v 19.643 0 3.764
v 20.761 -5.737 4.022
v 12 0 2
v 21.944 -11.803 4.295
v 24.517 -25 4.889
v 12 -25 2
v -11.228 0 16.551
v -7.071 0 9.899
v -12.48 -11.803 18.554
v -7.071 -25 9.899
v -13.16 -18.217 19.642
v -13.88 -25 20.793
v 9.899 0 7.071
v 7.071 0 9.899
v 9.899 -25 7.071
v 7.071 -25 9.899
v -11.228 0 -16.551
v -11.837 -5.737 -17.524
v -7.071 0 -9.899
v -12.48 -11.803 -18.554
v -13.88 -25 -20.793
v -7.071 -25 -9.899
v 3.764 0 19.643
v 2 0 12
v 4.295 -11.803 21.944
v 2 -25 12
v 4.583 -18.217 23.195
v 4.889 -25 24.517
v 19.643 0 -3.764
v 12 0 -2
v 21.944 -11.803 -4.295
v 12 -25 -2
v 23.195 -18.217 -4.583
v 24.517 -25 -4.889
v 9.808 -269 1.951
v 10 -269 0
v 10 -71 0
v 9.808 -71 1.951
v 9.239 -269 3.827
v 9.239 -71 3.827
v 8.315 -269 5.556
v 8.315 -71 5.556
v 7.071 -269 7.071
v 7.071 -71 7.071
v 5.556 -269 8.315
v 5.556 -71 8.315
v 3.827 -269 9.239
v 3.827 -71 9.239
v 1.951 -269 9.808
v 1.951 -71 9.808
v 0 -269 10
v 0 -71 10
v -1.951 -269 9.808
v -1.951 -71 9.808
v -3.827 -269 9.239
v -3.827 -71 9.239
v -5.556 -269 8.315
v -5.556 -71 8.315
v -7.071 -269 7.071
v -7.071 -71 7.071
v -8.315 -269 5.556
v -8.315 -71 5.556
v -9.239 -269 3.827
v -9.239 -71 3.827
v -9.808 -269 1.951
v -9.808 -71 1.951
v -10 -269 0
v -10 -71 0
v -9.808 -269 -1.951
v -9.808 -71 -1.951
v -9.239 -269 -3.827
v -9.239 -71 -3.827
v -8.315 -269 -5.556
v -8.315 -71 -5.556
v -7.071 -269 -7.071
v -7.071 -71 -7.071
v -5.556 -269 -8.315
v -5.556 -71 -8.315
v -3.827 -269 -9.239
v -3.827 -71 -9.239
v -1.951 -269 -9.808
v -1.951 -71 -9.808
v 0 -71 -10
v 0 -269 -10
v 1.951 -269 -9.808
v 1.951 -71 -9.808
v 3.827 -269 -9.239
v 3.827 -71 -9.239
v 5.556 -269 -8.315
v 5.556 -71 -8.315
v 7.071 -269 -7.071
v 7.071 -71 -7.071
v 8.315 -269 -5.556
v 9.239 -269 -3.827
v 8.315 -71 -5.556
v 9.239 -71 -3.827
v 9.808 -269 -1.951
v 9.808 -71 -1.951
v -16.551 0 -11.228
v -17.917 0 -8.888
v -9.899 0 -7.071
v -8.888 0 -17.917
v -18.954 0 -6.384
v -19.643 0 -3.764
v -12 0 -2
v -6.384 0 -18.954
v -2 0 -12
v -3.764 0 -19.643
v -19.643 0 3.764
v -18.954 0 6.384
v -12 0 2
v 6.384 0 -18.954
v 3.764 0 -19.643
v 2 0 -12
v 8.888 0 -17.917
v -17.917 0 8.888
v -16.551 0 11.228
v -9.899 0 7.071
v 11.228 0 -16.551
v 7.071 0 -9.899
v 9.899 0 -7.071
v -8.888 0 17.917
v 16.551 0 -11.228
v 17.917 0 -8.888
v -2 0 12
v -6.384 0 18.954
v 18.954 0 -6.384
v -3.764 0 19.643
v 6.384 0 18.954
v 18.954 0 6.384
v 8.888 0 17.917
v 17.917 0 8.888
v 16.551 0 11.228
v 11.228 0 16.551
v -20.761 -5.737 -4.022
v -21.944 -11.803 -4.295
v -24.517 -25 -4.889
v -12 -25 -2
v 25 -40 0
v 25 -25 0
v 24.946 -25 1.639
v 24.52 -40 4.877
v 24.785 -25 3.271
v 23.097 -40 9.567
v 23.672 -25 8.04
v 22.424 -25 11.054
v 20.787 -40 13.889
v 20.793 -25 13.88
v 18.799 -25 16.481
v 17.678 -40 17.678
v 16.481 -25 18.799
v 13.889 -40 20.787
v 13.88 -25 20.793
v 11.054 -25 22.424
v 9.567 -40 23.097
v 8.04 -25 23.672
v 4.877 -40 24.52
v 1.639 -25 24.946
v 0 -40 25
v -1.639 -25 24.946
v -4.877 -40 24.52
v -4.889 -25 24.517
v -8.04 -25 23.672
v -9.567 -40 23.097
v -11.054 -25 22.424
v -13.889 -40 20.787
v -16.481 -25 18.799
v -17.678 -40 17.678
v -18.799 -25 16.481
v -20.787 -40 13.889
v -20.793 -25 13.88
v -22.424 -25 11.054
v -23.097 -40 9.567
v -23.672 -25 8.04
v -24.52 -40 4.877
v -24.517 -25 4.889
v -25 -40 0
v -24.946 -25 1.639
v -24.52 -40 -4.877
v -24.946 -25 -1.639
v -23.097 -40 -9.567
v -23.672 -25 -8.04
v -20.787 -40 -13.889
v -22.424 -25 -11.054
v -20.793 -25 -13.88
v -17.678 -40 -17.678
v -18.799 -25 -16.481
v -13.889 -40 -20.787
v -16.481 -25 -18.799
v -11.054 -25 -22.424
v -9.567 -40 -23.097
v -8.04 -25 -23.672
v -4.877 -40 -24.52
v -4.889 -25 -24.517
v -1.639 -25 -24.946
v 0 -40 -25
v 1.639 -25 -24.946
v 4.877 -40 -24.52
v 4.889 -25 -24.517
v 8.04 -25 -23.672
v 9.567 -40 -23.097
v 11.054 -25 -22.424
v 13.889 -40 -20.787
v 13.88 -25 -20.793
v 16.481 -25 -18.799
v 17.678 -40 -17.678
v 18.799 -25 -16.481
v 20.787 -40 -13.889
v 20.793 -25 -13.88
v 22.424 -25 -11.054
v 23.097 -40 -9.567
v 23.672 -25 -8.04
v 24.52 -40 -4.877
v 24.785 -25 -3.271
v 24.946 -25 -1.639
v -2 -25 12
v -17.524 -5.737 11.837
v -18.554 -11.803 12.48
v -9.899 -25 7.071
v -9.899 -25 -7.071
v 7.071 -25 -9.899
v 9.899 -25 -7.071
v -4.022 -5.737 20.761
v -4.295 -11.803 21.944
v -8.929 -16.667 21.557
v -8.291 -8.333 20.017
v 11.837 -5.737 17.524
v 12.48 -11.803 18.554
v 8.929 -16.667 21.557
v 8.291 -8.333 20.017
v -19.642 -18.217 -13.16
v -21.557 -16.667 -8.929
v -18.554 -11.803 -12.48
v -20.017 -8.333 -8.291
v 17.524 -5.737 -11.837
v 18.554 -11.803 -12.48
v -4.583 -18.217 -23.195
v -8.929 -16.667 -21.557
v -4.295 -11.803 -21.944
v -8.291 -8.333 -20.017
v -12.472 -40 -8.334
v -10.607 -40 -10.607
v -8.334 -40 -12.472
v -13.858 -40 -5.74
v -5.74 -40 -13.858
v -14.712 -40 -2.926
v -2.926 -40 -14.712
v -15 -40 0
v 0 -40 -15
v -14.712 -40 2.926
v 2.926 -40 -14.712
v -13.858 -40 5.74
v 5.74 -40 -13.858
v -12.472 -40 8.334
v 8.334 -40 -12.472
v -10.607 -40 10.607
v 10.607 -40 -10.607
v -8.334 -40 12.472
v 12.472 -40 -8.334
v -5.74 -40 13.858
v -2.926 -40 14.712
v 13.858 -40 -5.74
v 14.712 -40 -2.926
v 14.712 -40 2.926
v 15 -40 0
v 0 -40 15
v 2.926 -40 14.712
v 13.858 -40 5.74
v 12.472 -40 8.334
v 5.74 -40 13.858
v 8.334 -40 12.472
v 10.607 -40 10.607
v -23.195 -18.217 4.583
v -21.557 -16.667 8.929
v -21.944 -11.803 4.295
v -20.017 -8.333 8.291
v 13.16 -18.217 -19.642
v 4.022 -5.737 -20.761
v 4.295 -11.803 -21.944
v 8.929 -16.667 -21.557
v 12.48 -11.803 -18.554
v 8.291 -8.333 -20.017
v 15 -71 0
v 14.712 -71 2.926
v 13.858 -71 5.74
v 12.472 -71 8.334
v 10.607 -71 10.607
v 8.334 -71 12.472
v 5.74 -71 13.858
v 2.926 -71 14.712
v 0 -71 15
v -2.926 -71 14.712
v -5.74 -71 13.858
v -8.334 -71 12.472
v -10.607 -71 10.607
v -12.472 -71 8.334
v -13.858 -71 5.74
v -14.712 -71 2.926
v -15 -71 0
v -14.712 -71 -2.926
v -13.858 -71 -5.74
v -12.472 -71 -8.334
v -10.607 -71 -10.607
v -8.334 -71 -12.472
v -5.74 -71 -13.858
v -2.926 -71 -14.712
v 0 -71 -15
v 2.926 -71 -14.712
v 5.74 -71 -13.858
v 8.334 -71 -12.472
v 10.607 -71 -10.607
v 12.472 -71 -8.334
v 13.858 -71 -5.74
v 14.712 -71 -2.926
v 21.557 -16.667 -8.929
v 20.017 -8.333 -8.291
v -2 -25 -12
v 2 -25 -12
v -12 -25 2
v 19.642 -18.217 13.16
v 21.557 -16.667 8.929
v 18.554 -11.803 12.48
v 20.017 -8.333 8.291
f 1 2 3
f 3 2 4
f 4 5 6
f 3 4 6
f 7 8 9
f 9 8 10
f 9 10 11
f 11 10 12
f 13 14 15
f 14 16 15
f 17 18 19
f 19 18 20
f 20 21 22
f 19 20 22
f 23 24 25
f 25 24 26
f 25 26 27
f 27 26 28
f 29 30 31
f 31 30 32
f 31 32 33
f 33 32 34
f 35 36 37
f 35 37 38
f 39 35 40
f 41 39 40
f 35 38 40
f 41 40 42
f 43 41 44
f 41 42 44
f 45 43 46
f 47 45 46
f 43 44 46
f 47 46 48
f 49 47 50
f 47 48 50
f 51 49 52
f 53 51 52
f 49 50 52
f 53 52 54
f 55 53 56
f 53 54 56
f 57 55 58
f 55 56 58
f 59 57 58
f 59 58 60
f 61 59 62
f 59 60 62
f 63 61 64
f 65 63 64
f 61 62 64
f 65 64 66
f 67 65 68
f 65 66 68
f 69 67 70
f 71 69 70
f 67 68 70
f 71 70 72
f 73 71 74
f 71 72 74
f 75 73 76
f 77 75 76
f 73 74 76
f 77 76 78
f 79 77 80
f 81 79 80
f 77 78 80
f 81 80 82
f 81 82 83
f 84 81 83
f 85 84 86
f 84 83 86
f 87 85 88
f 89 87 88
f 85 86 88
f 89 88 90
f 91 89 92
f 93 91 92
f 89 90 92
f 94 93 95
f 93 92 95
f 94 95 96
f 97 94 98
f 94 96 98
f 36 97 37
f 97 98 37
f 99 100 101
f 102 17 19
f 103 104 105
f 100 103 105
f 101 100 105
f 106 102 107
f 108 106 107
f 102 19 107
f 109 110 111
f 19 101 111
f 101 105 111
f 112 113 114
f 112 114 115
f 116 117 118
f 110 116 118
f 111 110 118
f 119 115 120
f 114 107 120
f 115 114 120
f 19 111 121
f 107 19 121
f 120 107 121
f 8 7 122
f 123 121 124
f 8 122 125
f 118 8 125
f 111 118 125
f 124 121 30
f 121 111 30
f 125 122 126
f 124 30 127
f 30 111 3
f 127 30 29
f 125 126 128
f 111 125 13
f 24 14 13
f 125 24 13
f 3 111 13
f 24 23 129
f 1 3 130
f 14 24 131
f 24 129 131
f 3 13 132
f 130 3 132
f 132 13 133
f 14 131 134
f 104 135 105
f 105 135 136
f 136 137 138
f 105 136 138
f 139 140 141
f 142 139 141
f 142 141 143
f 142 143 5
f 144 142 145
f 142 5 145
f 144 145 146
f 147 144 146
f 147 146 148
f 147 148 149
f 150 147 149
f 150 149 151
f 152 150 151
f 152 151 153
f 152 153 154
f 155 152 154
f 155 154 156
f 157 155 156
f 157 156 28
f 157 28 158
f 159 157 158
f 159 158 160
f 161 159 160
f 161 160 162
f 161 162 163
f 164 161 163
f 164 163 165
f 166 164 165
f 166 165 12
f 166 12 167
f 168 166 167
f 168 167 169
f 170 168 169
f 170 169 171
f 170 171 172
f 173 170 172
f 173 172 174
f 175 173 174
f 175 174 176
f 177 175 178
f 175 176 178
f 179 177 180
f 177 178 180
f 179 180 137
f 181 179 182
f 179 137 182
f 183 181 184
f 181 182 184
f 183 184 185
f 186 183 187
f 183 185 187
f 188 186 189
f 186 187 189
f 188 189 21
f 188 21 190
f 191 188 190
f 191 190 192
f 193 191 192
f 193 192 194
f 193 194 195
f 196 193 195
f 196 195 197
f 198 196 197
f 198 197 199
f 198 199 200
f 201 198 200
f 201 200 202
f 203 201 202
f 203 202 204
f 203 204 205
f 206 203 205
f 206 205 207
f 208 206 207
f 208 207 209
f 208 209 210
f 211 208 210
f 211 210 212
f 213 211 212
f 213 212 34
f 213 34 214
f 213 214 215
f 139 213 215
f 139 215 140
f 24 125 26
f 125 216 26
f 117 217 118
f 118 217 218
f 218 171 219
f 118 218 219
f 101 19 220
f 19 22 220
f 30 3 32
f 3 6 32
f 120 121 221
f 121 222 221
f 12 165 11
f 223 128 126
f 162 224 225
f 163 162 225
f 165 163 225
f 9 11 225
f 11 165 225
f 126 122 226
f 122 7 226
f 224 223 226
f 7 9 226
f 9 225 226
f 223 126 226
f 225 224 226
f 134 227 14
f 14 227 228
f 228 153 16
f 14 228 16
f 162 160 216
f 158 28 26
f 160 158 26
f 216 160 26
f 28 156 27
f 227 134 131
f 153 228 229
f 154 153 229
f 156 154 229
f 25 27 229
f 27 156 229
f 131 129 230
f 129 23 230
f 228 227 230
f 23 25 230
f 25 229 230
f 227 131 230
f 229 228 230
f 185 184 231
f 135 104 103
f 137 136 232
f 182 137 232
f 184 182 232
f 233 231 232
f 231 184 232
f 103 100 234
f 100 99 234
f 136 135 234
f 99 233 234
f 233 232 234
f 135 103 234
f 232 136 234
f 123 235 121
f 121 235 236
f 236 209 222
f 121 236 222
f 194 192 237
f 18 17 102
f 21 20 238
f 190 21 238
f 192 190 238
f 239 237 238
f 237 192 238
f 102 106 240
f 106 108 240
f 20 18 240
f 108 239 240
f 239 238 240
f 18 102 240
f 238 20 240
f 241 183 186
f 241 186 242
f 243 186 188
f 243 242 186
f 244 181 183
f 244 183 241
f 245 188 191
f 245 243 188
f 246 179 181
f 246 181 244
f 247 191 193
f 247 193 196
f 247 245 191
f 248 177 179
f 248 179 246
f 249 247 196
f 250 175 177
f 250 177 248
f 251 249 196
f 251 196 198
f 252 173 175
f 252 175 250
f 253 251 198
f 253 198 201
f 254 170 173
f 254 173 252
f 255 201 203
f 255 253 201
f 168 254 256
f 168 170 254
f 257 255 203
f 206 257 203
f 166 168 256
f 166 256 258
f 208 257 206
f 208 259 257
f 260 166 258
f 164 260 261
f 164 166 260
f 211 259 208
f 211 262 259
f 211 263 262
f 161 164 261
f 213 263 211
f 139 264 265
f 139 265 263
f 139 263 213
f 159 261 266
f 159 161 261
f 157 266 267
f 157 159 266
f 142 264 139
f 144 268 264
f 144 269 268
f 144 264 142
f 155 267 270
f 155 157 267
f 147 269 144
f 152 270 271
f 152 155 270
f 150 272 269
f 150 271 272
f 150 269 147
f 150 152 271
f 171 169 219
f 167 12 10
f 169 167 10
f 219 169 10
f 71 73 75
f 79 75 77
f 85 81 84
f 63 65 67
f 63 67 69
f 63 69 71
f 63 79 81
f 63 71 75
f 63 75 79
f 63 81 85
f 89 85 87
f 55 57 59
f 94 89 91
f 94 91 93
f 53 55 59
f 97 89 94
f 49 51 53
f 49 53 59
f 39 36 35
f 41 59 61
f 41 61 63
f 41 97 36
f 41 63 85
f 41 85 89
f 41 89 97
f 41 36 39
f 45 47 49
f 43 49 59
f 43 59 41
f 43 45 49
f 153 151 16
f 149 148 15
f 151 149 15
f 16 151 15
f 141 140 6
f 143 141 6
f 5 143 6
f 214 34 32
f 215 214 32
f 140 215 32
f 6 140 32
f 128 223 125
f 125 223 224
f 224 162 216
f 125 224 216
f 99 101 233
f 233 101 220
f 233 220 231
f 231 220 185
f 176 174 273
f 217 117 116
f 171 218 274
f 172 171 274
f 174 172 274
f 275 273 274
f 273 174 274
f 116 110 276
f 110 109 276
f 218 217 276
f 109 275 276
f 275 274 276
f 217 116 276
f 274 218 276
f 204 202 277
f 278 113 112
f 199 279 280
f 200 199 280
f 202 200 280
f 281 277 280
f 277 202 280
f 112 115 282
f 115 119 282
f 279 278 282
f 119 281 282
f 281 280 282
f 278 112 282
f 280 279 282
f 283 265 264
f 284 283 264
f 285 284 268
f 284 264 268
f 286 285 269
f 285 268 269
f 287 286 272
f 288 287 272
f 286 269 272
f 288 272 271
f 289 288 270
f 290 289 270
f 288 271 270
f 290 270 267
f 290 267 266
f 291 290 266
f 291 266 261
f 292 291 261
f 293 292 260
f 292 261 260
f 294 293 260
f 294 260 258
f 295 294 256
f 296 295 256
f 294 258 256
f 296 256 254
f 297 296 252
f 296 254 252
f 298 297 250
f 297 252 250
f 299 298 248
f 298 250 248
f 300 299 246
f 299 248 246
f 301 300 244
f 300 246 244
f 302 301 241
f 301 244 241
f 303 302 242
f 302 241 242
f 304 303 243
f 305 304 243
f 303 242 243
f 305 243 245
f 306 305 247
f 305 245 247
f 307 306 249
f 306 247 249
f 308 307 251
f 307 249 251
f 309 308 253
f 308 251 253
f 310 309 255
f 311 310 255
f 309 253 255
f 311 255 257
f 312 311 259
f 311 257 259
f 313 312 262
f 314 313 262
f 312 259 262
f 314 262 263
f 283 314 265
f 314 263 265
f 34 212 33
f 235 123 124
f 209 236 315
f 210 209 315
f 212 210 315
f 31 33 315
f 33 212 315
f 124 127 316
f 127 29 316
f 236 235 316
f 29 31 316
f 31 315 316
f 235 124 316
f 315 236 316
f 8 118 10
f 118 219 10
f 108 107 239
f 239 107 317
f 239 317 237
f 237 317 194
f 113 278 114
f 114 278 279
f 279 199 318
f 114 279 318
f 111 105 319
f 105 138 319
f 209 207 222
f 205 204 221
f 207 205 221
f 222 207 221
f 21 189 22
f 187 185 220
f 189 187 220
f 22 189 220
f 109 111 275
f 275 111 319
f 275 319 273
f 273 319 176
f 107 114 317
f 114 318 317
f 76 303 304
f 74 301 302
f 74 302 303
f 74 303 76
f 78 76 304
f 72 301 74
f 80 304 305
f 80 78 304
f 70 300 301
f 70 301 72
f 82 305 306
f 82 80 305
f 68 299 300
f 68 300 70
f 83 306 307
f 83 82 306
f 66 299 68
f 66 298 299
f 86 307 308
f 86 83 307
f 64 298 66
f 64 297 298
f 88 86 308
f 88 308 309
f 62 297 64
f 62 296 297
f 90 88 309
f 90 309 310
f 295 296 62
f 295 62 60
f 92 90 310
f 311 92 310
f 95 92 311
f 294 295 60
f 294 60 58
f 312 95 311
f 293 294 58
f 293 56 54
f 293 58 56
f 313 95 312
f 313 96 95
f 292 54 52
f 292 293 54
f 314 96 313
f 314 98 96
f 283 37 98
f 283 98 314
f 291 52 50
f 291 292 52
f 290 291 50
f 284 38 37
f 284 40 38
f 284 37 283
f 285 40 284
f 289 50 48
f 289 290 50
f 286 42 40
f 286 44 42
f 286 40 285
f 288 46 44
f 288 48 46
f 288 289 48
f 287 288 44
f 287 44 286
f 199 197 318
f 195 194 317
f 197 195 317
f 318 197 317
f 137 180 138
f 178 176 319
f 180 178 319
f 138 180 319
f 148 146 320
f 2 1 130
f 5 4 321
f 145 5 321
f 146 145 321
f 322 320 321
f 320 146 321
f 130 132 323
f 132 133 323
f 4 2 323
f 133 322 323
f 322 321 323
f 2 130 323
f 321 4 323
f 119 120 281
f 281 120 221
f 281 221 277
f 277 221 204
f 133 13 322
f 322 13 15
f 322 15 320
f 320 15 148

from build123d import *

# Parameters (mm, degrees)
F0_R            = 25
F1_DEPTH        = 40
F2_SIZE2        = 5
F2_SIZE         = 25
F7_COPIES_COUNT = 8
F8_R            = 15
F9_DEPTH        = 31
F10_R           = 10
F11_DEPTH       = 198


# Not quite as in the source:
# - a pattern or mirror of a feature is missing from the dataset's text; its kind, count and spacing are read off the source's solid


with BuildPart() as f1:
    # F0 (on Front) → F1 (new body)
    with BuildSketch(Plane.XZ):
        Circle(F0_R)
    extrude(amount=F1_DEPTH)

    # F2
    f2_edges = [f1.edges().sort_by_distance(p)[0] for p in [
        (-25, 0, 0),
    ]]
    f2_side = f1.faces().sort_by_distance((-25, -20, 0))[0]
    chamfer(f2_edges, length=F2_SIZE, length2=F2_SIZE2, reference=f2_side)

    # F4 (on Front) → F7 section 0
    with BuildSketch(Plane.XZ):
        Polygon((8, -38), (2, -12), (-2, -12), (-8, -38), align=None)
    # F5 (on offset) → F7 section 1
    with BuildSketch(Plane.XZ.offset(25)):
        Polygon((8, -38), (2, -12), (-2, -12), (-8, -38), align=None)
    f7 = loft(mode=Mode.SUBTRACT)

    # F7_copies: F7 ×8 about axis
    f7_copies_axis = Axis((0, 0, 0), (0, 1, 0))
    for i in range(1, F7_COPIES_COUNT):
        add(f7.rotate(f7_copies_axis, i * 360 / F7_COPIES_COUNT), mode=Mode.SUBTRACT)

    # F8 (on face) → F9 (join)
    with BuildSketch(Plane.XZ.offset(40)):
        Circle(F8_R)
    extrude(amount=F9_DEPTH)

    # F10 (on face) → F11 (join)
    with BuildSketch(Plane.XZ.offset(71)):
        Circle(F10_R)
    extrude(amount=F11_DEPTH)


solid = f1.part
